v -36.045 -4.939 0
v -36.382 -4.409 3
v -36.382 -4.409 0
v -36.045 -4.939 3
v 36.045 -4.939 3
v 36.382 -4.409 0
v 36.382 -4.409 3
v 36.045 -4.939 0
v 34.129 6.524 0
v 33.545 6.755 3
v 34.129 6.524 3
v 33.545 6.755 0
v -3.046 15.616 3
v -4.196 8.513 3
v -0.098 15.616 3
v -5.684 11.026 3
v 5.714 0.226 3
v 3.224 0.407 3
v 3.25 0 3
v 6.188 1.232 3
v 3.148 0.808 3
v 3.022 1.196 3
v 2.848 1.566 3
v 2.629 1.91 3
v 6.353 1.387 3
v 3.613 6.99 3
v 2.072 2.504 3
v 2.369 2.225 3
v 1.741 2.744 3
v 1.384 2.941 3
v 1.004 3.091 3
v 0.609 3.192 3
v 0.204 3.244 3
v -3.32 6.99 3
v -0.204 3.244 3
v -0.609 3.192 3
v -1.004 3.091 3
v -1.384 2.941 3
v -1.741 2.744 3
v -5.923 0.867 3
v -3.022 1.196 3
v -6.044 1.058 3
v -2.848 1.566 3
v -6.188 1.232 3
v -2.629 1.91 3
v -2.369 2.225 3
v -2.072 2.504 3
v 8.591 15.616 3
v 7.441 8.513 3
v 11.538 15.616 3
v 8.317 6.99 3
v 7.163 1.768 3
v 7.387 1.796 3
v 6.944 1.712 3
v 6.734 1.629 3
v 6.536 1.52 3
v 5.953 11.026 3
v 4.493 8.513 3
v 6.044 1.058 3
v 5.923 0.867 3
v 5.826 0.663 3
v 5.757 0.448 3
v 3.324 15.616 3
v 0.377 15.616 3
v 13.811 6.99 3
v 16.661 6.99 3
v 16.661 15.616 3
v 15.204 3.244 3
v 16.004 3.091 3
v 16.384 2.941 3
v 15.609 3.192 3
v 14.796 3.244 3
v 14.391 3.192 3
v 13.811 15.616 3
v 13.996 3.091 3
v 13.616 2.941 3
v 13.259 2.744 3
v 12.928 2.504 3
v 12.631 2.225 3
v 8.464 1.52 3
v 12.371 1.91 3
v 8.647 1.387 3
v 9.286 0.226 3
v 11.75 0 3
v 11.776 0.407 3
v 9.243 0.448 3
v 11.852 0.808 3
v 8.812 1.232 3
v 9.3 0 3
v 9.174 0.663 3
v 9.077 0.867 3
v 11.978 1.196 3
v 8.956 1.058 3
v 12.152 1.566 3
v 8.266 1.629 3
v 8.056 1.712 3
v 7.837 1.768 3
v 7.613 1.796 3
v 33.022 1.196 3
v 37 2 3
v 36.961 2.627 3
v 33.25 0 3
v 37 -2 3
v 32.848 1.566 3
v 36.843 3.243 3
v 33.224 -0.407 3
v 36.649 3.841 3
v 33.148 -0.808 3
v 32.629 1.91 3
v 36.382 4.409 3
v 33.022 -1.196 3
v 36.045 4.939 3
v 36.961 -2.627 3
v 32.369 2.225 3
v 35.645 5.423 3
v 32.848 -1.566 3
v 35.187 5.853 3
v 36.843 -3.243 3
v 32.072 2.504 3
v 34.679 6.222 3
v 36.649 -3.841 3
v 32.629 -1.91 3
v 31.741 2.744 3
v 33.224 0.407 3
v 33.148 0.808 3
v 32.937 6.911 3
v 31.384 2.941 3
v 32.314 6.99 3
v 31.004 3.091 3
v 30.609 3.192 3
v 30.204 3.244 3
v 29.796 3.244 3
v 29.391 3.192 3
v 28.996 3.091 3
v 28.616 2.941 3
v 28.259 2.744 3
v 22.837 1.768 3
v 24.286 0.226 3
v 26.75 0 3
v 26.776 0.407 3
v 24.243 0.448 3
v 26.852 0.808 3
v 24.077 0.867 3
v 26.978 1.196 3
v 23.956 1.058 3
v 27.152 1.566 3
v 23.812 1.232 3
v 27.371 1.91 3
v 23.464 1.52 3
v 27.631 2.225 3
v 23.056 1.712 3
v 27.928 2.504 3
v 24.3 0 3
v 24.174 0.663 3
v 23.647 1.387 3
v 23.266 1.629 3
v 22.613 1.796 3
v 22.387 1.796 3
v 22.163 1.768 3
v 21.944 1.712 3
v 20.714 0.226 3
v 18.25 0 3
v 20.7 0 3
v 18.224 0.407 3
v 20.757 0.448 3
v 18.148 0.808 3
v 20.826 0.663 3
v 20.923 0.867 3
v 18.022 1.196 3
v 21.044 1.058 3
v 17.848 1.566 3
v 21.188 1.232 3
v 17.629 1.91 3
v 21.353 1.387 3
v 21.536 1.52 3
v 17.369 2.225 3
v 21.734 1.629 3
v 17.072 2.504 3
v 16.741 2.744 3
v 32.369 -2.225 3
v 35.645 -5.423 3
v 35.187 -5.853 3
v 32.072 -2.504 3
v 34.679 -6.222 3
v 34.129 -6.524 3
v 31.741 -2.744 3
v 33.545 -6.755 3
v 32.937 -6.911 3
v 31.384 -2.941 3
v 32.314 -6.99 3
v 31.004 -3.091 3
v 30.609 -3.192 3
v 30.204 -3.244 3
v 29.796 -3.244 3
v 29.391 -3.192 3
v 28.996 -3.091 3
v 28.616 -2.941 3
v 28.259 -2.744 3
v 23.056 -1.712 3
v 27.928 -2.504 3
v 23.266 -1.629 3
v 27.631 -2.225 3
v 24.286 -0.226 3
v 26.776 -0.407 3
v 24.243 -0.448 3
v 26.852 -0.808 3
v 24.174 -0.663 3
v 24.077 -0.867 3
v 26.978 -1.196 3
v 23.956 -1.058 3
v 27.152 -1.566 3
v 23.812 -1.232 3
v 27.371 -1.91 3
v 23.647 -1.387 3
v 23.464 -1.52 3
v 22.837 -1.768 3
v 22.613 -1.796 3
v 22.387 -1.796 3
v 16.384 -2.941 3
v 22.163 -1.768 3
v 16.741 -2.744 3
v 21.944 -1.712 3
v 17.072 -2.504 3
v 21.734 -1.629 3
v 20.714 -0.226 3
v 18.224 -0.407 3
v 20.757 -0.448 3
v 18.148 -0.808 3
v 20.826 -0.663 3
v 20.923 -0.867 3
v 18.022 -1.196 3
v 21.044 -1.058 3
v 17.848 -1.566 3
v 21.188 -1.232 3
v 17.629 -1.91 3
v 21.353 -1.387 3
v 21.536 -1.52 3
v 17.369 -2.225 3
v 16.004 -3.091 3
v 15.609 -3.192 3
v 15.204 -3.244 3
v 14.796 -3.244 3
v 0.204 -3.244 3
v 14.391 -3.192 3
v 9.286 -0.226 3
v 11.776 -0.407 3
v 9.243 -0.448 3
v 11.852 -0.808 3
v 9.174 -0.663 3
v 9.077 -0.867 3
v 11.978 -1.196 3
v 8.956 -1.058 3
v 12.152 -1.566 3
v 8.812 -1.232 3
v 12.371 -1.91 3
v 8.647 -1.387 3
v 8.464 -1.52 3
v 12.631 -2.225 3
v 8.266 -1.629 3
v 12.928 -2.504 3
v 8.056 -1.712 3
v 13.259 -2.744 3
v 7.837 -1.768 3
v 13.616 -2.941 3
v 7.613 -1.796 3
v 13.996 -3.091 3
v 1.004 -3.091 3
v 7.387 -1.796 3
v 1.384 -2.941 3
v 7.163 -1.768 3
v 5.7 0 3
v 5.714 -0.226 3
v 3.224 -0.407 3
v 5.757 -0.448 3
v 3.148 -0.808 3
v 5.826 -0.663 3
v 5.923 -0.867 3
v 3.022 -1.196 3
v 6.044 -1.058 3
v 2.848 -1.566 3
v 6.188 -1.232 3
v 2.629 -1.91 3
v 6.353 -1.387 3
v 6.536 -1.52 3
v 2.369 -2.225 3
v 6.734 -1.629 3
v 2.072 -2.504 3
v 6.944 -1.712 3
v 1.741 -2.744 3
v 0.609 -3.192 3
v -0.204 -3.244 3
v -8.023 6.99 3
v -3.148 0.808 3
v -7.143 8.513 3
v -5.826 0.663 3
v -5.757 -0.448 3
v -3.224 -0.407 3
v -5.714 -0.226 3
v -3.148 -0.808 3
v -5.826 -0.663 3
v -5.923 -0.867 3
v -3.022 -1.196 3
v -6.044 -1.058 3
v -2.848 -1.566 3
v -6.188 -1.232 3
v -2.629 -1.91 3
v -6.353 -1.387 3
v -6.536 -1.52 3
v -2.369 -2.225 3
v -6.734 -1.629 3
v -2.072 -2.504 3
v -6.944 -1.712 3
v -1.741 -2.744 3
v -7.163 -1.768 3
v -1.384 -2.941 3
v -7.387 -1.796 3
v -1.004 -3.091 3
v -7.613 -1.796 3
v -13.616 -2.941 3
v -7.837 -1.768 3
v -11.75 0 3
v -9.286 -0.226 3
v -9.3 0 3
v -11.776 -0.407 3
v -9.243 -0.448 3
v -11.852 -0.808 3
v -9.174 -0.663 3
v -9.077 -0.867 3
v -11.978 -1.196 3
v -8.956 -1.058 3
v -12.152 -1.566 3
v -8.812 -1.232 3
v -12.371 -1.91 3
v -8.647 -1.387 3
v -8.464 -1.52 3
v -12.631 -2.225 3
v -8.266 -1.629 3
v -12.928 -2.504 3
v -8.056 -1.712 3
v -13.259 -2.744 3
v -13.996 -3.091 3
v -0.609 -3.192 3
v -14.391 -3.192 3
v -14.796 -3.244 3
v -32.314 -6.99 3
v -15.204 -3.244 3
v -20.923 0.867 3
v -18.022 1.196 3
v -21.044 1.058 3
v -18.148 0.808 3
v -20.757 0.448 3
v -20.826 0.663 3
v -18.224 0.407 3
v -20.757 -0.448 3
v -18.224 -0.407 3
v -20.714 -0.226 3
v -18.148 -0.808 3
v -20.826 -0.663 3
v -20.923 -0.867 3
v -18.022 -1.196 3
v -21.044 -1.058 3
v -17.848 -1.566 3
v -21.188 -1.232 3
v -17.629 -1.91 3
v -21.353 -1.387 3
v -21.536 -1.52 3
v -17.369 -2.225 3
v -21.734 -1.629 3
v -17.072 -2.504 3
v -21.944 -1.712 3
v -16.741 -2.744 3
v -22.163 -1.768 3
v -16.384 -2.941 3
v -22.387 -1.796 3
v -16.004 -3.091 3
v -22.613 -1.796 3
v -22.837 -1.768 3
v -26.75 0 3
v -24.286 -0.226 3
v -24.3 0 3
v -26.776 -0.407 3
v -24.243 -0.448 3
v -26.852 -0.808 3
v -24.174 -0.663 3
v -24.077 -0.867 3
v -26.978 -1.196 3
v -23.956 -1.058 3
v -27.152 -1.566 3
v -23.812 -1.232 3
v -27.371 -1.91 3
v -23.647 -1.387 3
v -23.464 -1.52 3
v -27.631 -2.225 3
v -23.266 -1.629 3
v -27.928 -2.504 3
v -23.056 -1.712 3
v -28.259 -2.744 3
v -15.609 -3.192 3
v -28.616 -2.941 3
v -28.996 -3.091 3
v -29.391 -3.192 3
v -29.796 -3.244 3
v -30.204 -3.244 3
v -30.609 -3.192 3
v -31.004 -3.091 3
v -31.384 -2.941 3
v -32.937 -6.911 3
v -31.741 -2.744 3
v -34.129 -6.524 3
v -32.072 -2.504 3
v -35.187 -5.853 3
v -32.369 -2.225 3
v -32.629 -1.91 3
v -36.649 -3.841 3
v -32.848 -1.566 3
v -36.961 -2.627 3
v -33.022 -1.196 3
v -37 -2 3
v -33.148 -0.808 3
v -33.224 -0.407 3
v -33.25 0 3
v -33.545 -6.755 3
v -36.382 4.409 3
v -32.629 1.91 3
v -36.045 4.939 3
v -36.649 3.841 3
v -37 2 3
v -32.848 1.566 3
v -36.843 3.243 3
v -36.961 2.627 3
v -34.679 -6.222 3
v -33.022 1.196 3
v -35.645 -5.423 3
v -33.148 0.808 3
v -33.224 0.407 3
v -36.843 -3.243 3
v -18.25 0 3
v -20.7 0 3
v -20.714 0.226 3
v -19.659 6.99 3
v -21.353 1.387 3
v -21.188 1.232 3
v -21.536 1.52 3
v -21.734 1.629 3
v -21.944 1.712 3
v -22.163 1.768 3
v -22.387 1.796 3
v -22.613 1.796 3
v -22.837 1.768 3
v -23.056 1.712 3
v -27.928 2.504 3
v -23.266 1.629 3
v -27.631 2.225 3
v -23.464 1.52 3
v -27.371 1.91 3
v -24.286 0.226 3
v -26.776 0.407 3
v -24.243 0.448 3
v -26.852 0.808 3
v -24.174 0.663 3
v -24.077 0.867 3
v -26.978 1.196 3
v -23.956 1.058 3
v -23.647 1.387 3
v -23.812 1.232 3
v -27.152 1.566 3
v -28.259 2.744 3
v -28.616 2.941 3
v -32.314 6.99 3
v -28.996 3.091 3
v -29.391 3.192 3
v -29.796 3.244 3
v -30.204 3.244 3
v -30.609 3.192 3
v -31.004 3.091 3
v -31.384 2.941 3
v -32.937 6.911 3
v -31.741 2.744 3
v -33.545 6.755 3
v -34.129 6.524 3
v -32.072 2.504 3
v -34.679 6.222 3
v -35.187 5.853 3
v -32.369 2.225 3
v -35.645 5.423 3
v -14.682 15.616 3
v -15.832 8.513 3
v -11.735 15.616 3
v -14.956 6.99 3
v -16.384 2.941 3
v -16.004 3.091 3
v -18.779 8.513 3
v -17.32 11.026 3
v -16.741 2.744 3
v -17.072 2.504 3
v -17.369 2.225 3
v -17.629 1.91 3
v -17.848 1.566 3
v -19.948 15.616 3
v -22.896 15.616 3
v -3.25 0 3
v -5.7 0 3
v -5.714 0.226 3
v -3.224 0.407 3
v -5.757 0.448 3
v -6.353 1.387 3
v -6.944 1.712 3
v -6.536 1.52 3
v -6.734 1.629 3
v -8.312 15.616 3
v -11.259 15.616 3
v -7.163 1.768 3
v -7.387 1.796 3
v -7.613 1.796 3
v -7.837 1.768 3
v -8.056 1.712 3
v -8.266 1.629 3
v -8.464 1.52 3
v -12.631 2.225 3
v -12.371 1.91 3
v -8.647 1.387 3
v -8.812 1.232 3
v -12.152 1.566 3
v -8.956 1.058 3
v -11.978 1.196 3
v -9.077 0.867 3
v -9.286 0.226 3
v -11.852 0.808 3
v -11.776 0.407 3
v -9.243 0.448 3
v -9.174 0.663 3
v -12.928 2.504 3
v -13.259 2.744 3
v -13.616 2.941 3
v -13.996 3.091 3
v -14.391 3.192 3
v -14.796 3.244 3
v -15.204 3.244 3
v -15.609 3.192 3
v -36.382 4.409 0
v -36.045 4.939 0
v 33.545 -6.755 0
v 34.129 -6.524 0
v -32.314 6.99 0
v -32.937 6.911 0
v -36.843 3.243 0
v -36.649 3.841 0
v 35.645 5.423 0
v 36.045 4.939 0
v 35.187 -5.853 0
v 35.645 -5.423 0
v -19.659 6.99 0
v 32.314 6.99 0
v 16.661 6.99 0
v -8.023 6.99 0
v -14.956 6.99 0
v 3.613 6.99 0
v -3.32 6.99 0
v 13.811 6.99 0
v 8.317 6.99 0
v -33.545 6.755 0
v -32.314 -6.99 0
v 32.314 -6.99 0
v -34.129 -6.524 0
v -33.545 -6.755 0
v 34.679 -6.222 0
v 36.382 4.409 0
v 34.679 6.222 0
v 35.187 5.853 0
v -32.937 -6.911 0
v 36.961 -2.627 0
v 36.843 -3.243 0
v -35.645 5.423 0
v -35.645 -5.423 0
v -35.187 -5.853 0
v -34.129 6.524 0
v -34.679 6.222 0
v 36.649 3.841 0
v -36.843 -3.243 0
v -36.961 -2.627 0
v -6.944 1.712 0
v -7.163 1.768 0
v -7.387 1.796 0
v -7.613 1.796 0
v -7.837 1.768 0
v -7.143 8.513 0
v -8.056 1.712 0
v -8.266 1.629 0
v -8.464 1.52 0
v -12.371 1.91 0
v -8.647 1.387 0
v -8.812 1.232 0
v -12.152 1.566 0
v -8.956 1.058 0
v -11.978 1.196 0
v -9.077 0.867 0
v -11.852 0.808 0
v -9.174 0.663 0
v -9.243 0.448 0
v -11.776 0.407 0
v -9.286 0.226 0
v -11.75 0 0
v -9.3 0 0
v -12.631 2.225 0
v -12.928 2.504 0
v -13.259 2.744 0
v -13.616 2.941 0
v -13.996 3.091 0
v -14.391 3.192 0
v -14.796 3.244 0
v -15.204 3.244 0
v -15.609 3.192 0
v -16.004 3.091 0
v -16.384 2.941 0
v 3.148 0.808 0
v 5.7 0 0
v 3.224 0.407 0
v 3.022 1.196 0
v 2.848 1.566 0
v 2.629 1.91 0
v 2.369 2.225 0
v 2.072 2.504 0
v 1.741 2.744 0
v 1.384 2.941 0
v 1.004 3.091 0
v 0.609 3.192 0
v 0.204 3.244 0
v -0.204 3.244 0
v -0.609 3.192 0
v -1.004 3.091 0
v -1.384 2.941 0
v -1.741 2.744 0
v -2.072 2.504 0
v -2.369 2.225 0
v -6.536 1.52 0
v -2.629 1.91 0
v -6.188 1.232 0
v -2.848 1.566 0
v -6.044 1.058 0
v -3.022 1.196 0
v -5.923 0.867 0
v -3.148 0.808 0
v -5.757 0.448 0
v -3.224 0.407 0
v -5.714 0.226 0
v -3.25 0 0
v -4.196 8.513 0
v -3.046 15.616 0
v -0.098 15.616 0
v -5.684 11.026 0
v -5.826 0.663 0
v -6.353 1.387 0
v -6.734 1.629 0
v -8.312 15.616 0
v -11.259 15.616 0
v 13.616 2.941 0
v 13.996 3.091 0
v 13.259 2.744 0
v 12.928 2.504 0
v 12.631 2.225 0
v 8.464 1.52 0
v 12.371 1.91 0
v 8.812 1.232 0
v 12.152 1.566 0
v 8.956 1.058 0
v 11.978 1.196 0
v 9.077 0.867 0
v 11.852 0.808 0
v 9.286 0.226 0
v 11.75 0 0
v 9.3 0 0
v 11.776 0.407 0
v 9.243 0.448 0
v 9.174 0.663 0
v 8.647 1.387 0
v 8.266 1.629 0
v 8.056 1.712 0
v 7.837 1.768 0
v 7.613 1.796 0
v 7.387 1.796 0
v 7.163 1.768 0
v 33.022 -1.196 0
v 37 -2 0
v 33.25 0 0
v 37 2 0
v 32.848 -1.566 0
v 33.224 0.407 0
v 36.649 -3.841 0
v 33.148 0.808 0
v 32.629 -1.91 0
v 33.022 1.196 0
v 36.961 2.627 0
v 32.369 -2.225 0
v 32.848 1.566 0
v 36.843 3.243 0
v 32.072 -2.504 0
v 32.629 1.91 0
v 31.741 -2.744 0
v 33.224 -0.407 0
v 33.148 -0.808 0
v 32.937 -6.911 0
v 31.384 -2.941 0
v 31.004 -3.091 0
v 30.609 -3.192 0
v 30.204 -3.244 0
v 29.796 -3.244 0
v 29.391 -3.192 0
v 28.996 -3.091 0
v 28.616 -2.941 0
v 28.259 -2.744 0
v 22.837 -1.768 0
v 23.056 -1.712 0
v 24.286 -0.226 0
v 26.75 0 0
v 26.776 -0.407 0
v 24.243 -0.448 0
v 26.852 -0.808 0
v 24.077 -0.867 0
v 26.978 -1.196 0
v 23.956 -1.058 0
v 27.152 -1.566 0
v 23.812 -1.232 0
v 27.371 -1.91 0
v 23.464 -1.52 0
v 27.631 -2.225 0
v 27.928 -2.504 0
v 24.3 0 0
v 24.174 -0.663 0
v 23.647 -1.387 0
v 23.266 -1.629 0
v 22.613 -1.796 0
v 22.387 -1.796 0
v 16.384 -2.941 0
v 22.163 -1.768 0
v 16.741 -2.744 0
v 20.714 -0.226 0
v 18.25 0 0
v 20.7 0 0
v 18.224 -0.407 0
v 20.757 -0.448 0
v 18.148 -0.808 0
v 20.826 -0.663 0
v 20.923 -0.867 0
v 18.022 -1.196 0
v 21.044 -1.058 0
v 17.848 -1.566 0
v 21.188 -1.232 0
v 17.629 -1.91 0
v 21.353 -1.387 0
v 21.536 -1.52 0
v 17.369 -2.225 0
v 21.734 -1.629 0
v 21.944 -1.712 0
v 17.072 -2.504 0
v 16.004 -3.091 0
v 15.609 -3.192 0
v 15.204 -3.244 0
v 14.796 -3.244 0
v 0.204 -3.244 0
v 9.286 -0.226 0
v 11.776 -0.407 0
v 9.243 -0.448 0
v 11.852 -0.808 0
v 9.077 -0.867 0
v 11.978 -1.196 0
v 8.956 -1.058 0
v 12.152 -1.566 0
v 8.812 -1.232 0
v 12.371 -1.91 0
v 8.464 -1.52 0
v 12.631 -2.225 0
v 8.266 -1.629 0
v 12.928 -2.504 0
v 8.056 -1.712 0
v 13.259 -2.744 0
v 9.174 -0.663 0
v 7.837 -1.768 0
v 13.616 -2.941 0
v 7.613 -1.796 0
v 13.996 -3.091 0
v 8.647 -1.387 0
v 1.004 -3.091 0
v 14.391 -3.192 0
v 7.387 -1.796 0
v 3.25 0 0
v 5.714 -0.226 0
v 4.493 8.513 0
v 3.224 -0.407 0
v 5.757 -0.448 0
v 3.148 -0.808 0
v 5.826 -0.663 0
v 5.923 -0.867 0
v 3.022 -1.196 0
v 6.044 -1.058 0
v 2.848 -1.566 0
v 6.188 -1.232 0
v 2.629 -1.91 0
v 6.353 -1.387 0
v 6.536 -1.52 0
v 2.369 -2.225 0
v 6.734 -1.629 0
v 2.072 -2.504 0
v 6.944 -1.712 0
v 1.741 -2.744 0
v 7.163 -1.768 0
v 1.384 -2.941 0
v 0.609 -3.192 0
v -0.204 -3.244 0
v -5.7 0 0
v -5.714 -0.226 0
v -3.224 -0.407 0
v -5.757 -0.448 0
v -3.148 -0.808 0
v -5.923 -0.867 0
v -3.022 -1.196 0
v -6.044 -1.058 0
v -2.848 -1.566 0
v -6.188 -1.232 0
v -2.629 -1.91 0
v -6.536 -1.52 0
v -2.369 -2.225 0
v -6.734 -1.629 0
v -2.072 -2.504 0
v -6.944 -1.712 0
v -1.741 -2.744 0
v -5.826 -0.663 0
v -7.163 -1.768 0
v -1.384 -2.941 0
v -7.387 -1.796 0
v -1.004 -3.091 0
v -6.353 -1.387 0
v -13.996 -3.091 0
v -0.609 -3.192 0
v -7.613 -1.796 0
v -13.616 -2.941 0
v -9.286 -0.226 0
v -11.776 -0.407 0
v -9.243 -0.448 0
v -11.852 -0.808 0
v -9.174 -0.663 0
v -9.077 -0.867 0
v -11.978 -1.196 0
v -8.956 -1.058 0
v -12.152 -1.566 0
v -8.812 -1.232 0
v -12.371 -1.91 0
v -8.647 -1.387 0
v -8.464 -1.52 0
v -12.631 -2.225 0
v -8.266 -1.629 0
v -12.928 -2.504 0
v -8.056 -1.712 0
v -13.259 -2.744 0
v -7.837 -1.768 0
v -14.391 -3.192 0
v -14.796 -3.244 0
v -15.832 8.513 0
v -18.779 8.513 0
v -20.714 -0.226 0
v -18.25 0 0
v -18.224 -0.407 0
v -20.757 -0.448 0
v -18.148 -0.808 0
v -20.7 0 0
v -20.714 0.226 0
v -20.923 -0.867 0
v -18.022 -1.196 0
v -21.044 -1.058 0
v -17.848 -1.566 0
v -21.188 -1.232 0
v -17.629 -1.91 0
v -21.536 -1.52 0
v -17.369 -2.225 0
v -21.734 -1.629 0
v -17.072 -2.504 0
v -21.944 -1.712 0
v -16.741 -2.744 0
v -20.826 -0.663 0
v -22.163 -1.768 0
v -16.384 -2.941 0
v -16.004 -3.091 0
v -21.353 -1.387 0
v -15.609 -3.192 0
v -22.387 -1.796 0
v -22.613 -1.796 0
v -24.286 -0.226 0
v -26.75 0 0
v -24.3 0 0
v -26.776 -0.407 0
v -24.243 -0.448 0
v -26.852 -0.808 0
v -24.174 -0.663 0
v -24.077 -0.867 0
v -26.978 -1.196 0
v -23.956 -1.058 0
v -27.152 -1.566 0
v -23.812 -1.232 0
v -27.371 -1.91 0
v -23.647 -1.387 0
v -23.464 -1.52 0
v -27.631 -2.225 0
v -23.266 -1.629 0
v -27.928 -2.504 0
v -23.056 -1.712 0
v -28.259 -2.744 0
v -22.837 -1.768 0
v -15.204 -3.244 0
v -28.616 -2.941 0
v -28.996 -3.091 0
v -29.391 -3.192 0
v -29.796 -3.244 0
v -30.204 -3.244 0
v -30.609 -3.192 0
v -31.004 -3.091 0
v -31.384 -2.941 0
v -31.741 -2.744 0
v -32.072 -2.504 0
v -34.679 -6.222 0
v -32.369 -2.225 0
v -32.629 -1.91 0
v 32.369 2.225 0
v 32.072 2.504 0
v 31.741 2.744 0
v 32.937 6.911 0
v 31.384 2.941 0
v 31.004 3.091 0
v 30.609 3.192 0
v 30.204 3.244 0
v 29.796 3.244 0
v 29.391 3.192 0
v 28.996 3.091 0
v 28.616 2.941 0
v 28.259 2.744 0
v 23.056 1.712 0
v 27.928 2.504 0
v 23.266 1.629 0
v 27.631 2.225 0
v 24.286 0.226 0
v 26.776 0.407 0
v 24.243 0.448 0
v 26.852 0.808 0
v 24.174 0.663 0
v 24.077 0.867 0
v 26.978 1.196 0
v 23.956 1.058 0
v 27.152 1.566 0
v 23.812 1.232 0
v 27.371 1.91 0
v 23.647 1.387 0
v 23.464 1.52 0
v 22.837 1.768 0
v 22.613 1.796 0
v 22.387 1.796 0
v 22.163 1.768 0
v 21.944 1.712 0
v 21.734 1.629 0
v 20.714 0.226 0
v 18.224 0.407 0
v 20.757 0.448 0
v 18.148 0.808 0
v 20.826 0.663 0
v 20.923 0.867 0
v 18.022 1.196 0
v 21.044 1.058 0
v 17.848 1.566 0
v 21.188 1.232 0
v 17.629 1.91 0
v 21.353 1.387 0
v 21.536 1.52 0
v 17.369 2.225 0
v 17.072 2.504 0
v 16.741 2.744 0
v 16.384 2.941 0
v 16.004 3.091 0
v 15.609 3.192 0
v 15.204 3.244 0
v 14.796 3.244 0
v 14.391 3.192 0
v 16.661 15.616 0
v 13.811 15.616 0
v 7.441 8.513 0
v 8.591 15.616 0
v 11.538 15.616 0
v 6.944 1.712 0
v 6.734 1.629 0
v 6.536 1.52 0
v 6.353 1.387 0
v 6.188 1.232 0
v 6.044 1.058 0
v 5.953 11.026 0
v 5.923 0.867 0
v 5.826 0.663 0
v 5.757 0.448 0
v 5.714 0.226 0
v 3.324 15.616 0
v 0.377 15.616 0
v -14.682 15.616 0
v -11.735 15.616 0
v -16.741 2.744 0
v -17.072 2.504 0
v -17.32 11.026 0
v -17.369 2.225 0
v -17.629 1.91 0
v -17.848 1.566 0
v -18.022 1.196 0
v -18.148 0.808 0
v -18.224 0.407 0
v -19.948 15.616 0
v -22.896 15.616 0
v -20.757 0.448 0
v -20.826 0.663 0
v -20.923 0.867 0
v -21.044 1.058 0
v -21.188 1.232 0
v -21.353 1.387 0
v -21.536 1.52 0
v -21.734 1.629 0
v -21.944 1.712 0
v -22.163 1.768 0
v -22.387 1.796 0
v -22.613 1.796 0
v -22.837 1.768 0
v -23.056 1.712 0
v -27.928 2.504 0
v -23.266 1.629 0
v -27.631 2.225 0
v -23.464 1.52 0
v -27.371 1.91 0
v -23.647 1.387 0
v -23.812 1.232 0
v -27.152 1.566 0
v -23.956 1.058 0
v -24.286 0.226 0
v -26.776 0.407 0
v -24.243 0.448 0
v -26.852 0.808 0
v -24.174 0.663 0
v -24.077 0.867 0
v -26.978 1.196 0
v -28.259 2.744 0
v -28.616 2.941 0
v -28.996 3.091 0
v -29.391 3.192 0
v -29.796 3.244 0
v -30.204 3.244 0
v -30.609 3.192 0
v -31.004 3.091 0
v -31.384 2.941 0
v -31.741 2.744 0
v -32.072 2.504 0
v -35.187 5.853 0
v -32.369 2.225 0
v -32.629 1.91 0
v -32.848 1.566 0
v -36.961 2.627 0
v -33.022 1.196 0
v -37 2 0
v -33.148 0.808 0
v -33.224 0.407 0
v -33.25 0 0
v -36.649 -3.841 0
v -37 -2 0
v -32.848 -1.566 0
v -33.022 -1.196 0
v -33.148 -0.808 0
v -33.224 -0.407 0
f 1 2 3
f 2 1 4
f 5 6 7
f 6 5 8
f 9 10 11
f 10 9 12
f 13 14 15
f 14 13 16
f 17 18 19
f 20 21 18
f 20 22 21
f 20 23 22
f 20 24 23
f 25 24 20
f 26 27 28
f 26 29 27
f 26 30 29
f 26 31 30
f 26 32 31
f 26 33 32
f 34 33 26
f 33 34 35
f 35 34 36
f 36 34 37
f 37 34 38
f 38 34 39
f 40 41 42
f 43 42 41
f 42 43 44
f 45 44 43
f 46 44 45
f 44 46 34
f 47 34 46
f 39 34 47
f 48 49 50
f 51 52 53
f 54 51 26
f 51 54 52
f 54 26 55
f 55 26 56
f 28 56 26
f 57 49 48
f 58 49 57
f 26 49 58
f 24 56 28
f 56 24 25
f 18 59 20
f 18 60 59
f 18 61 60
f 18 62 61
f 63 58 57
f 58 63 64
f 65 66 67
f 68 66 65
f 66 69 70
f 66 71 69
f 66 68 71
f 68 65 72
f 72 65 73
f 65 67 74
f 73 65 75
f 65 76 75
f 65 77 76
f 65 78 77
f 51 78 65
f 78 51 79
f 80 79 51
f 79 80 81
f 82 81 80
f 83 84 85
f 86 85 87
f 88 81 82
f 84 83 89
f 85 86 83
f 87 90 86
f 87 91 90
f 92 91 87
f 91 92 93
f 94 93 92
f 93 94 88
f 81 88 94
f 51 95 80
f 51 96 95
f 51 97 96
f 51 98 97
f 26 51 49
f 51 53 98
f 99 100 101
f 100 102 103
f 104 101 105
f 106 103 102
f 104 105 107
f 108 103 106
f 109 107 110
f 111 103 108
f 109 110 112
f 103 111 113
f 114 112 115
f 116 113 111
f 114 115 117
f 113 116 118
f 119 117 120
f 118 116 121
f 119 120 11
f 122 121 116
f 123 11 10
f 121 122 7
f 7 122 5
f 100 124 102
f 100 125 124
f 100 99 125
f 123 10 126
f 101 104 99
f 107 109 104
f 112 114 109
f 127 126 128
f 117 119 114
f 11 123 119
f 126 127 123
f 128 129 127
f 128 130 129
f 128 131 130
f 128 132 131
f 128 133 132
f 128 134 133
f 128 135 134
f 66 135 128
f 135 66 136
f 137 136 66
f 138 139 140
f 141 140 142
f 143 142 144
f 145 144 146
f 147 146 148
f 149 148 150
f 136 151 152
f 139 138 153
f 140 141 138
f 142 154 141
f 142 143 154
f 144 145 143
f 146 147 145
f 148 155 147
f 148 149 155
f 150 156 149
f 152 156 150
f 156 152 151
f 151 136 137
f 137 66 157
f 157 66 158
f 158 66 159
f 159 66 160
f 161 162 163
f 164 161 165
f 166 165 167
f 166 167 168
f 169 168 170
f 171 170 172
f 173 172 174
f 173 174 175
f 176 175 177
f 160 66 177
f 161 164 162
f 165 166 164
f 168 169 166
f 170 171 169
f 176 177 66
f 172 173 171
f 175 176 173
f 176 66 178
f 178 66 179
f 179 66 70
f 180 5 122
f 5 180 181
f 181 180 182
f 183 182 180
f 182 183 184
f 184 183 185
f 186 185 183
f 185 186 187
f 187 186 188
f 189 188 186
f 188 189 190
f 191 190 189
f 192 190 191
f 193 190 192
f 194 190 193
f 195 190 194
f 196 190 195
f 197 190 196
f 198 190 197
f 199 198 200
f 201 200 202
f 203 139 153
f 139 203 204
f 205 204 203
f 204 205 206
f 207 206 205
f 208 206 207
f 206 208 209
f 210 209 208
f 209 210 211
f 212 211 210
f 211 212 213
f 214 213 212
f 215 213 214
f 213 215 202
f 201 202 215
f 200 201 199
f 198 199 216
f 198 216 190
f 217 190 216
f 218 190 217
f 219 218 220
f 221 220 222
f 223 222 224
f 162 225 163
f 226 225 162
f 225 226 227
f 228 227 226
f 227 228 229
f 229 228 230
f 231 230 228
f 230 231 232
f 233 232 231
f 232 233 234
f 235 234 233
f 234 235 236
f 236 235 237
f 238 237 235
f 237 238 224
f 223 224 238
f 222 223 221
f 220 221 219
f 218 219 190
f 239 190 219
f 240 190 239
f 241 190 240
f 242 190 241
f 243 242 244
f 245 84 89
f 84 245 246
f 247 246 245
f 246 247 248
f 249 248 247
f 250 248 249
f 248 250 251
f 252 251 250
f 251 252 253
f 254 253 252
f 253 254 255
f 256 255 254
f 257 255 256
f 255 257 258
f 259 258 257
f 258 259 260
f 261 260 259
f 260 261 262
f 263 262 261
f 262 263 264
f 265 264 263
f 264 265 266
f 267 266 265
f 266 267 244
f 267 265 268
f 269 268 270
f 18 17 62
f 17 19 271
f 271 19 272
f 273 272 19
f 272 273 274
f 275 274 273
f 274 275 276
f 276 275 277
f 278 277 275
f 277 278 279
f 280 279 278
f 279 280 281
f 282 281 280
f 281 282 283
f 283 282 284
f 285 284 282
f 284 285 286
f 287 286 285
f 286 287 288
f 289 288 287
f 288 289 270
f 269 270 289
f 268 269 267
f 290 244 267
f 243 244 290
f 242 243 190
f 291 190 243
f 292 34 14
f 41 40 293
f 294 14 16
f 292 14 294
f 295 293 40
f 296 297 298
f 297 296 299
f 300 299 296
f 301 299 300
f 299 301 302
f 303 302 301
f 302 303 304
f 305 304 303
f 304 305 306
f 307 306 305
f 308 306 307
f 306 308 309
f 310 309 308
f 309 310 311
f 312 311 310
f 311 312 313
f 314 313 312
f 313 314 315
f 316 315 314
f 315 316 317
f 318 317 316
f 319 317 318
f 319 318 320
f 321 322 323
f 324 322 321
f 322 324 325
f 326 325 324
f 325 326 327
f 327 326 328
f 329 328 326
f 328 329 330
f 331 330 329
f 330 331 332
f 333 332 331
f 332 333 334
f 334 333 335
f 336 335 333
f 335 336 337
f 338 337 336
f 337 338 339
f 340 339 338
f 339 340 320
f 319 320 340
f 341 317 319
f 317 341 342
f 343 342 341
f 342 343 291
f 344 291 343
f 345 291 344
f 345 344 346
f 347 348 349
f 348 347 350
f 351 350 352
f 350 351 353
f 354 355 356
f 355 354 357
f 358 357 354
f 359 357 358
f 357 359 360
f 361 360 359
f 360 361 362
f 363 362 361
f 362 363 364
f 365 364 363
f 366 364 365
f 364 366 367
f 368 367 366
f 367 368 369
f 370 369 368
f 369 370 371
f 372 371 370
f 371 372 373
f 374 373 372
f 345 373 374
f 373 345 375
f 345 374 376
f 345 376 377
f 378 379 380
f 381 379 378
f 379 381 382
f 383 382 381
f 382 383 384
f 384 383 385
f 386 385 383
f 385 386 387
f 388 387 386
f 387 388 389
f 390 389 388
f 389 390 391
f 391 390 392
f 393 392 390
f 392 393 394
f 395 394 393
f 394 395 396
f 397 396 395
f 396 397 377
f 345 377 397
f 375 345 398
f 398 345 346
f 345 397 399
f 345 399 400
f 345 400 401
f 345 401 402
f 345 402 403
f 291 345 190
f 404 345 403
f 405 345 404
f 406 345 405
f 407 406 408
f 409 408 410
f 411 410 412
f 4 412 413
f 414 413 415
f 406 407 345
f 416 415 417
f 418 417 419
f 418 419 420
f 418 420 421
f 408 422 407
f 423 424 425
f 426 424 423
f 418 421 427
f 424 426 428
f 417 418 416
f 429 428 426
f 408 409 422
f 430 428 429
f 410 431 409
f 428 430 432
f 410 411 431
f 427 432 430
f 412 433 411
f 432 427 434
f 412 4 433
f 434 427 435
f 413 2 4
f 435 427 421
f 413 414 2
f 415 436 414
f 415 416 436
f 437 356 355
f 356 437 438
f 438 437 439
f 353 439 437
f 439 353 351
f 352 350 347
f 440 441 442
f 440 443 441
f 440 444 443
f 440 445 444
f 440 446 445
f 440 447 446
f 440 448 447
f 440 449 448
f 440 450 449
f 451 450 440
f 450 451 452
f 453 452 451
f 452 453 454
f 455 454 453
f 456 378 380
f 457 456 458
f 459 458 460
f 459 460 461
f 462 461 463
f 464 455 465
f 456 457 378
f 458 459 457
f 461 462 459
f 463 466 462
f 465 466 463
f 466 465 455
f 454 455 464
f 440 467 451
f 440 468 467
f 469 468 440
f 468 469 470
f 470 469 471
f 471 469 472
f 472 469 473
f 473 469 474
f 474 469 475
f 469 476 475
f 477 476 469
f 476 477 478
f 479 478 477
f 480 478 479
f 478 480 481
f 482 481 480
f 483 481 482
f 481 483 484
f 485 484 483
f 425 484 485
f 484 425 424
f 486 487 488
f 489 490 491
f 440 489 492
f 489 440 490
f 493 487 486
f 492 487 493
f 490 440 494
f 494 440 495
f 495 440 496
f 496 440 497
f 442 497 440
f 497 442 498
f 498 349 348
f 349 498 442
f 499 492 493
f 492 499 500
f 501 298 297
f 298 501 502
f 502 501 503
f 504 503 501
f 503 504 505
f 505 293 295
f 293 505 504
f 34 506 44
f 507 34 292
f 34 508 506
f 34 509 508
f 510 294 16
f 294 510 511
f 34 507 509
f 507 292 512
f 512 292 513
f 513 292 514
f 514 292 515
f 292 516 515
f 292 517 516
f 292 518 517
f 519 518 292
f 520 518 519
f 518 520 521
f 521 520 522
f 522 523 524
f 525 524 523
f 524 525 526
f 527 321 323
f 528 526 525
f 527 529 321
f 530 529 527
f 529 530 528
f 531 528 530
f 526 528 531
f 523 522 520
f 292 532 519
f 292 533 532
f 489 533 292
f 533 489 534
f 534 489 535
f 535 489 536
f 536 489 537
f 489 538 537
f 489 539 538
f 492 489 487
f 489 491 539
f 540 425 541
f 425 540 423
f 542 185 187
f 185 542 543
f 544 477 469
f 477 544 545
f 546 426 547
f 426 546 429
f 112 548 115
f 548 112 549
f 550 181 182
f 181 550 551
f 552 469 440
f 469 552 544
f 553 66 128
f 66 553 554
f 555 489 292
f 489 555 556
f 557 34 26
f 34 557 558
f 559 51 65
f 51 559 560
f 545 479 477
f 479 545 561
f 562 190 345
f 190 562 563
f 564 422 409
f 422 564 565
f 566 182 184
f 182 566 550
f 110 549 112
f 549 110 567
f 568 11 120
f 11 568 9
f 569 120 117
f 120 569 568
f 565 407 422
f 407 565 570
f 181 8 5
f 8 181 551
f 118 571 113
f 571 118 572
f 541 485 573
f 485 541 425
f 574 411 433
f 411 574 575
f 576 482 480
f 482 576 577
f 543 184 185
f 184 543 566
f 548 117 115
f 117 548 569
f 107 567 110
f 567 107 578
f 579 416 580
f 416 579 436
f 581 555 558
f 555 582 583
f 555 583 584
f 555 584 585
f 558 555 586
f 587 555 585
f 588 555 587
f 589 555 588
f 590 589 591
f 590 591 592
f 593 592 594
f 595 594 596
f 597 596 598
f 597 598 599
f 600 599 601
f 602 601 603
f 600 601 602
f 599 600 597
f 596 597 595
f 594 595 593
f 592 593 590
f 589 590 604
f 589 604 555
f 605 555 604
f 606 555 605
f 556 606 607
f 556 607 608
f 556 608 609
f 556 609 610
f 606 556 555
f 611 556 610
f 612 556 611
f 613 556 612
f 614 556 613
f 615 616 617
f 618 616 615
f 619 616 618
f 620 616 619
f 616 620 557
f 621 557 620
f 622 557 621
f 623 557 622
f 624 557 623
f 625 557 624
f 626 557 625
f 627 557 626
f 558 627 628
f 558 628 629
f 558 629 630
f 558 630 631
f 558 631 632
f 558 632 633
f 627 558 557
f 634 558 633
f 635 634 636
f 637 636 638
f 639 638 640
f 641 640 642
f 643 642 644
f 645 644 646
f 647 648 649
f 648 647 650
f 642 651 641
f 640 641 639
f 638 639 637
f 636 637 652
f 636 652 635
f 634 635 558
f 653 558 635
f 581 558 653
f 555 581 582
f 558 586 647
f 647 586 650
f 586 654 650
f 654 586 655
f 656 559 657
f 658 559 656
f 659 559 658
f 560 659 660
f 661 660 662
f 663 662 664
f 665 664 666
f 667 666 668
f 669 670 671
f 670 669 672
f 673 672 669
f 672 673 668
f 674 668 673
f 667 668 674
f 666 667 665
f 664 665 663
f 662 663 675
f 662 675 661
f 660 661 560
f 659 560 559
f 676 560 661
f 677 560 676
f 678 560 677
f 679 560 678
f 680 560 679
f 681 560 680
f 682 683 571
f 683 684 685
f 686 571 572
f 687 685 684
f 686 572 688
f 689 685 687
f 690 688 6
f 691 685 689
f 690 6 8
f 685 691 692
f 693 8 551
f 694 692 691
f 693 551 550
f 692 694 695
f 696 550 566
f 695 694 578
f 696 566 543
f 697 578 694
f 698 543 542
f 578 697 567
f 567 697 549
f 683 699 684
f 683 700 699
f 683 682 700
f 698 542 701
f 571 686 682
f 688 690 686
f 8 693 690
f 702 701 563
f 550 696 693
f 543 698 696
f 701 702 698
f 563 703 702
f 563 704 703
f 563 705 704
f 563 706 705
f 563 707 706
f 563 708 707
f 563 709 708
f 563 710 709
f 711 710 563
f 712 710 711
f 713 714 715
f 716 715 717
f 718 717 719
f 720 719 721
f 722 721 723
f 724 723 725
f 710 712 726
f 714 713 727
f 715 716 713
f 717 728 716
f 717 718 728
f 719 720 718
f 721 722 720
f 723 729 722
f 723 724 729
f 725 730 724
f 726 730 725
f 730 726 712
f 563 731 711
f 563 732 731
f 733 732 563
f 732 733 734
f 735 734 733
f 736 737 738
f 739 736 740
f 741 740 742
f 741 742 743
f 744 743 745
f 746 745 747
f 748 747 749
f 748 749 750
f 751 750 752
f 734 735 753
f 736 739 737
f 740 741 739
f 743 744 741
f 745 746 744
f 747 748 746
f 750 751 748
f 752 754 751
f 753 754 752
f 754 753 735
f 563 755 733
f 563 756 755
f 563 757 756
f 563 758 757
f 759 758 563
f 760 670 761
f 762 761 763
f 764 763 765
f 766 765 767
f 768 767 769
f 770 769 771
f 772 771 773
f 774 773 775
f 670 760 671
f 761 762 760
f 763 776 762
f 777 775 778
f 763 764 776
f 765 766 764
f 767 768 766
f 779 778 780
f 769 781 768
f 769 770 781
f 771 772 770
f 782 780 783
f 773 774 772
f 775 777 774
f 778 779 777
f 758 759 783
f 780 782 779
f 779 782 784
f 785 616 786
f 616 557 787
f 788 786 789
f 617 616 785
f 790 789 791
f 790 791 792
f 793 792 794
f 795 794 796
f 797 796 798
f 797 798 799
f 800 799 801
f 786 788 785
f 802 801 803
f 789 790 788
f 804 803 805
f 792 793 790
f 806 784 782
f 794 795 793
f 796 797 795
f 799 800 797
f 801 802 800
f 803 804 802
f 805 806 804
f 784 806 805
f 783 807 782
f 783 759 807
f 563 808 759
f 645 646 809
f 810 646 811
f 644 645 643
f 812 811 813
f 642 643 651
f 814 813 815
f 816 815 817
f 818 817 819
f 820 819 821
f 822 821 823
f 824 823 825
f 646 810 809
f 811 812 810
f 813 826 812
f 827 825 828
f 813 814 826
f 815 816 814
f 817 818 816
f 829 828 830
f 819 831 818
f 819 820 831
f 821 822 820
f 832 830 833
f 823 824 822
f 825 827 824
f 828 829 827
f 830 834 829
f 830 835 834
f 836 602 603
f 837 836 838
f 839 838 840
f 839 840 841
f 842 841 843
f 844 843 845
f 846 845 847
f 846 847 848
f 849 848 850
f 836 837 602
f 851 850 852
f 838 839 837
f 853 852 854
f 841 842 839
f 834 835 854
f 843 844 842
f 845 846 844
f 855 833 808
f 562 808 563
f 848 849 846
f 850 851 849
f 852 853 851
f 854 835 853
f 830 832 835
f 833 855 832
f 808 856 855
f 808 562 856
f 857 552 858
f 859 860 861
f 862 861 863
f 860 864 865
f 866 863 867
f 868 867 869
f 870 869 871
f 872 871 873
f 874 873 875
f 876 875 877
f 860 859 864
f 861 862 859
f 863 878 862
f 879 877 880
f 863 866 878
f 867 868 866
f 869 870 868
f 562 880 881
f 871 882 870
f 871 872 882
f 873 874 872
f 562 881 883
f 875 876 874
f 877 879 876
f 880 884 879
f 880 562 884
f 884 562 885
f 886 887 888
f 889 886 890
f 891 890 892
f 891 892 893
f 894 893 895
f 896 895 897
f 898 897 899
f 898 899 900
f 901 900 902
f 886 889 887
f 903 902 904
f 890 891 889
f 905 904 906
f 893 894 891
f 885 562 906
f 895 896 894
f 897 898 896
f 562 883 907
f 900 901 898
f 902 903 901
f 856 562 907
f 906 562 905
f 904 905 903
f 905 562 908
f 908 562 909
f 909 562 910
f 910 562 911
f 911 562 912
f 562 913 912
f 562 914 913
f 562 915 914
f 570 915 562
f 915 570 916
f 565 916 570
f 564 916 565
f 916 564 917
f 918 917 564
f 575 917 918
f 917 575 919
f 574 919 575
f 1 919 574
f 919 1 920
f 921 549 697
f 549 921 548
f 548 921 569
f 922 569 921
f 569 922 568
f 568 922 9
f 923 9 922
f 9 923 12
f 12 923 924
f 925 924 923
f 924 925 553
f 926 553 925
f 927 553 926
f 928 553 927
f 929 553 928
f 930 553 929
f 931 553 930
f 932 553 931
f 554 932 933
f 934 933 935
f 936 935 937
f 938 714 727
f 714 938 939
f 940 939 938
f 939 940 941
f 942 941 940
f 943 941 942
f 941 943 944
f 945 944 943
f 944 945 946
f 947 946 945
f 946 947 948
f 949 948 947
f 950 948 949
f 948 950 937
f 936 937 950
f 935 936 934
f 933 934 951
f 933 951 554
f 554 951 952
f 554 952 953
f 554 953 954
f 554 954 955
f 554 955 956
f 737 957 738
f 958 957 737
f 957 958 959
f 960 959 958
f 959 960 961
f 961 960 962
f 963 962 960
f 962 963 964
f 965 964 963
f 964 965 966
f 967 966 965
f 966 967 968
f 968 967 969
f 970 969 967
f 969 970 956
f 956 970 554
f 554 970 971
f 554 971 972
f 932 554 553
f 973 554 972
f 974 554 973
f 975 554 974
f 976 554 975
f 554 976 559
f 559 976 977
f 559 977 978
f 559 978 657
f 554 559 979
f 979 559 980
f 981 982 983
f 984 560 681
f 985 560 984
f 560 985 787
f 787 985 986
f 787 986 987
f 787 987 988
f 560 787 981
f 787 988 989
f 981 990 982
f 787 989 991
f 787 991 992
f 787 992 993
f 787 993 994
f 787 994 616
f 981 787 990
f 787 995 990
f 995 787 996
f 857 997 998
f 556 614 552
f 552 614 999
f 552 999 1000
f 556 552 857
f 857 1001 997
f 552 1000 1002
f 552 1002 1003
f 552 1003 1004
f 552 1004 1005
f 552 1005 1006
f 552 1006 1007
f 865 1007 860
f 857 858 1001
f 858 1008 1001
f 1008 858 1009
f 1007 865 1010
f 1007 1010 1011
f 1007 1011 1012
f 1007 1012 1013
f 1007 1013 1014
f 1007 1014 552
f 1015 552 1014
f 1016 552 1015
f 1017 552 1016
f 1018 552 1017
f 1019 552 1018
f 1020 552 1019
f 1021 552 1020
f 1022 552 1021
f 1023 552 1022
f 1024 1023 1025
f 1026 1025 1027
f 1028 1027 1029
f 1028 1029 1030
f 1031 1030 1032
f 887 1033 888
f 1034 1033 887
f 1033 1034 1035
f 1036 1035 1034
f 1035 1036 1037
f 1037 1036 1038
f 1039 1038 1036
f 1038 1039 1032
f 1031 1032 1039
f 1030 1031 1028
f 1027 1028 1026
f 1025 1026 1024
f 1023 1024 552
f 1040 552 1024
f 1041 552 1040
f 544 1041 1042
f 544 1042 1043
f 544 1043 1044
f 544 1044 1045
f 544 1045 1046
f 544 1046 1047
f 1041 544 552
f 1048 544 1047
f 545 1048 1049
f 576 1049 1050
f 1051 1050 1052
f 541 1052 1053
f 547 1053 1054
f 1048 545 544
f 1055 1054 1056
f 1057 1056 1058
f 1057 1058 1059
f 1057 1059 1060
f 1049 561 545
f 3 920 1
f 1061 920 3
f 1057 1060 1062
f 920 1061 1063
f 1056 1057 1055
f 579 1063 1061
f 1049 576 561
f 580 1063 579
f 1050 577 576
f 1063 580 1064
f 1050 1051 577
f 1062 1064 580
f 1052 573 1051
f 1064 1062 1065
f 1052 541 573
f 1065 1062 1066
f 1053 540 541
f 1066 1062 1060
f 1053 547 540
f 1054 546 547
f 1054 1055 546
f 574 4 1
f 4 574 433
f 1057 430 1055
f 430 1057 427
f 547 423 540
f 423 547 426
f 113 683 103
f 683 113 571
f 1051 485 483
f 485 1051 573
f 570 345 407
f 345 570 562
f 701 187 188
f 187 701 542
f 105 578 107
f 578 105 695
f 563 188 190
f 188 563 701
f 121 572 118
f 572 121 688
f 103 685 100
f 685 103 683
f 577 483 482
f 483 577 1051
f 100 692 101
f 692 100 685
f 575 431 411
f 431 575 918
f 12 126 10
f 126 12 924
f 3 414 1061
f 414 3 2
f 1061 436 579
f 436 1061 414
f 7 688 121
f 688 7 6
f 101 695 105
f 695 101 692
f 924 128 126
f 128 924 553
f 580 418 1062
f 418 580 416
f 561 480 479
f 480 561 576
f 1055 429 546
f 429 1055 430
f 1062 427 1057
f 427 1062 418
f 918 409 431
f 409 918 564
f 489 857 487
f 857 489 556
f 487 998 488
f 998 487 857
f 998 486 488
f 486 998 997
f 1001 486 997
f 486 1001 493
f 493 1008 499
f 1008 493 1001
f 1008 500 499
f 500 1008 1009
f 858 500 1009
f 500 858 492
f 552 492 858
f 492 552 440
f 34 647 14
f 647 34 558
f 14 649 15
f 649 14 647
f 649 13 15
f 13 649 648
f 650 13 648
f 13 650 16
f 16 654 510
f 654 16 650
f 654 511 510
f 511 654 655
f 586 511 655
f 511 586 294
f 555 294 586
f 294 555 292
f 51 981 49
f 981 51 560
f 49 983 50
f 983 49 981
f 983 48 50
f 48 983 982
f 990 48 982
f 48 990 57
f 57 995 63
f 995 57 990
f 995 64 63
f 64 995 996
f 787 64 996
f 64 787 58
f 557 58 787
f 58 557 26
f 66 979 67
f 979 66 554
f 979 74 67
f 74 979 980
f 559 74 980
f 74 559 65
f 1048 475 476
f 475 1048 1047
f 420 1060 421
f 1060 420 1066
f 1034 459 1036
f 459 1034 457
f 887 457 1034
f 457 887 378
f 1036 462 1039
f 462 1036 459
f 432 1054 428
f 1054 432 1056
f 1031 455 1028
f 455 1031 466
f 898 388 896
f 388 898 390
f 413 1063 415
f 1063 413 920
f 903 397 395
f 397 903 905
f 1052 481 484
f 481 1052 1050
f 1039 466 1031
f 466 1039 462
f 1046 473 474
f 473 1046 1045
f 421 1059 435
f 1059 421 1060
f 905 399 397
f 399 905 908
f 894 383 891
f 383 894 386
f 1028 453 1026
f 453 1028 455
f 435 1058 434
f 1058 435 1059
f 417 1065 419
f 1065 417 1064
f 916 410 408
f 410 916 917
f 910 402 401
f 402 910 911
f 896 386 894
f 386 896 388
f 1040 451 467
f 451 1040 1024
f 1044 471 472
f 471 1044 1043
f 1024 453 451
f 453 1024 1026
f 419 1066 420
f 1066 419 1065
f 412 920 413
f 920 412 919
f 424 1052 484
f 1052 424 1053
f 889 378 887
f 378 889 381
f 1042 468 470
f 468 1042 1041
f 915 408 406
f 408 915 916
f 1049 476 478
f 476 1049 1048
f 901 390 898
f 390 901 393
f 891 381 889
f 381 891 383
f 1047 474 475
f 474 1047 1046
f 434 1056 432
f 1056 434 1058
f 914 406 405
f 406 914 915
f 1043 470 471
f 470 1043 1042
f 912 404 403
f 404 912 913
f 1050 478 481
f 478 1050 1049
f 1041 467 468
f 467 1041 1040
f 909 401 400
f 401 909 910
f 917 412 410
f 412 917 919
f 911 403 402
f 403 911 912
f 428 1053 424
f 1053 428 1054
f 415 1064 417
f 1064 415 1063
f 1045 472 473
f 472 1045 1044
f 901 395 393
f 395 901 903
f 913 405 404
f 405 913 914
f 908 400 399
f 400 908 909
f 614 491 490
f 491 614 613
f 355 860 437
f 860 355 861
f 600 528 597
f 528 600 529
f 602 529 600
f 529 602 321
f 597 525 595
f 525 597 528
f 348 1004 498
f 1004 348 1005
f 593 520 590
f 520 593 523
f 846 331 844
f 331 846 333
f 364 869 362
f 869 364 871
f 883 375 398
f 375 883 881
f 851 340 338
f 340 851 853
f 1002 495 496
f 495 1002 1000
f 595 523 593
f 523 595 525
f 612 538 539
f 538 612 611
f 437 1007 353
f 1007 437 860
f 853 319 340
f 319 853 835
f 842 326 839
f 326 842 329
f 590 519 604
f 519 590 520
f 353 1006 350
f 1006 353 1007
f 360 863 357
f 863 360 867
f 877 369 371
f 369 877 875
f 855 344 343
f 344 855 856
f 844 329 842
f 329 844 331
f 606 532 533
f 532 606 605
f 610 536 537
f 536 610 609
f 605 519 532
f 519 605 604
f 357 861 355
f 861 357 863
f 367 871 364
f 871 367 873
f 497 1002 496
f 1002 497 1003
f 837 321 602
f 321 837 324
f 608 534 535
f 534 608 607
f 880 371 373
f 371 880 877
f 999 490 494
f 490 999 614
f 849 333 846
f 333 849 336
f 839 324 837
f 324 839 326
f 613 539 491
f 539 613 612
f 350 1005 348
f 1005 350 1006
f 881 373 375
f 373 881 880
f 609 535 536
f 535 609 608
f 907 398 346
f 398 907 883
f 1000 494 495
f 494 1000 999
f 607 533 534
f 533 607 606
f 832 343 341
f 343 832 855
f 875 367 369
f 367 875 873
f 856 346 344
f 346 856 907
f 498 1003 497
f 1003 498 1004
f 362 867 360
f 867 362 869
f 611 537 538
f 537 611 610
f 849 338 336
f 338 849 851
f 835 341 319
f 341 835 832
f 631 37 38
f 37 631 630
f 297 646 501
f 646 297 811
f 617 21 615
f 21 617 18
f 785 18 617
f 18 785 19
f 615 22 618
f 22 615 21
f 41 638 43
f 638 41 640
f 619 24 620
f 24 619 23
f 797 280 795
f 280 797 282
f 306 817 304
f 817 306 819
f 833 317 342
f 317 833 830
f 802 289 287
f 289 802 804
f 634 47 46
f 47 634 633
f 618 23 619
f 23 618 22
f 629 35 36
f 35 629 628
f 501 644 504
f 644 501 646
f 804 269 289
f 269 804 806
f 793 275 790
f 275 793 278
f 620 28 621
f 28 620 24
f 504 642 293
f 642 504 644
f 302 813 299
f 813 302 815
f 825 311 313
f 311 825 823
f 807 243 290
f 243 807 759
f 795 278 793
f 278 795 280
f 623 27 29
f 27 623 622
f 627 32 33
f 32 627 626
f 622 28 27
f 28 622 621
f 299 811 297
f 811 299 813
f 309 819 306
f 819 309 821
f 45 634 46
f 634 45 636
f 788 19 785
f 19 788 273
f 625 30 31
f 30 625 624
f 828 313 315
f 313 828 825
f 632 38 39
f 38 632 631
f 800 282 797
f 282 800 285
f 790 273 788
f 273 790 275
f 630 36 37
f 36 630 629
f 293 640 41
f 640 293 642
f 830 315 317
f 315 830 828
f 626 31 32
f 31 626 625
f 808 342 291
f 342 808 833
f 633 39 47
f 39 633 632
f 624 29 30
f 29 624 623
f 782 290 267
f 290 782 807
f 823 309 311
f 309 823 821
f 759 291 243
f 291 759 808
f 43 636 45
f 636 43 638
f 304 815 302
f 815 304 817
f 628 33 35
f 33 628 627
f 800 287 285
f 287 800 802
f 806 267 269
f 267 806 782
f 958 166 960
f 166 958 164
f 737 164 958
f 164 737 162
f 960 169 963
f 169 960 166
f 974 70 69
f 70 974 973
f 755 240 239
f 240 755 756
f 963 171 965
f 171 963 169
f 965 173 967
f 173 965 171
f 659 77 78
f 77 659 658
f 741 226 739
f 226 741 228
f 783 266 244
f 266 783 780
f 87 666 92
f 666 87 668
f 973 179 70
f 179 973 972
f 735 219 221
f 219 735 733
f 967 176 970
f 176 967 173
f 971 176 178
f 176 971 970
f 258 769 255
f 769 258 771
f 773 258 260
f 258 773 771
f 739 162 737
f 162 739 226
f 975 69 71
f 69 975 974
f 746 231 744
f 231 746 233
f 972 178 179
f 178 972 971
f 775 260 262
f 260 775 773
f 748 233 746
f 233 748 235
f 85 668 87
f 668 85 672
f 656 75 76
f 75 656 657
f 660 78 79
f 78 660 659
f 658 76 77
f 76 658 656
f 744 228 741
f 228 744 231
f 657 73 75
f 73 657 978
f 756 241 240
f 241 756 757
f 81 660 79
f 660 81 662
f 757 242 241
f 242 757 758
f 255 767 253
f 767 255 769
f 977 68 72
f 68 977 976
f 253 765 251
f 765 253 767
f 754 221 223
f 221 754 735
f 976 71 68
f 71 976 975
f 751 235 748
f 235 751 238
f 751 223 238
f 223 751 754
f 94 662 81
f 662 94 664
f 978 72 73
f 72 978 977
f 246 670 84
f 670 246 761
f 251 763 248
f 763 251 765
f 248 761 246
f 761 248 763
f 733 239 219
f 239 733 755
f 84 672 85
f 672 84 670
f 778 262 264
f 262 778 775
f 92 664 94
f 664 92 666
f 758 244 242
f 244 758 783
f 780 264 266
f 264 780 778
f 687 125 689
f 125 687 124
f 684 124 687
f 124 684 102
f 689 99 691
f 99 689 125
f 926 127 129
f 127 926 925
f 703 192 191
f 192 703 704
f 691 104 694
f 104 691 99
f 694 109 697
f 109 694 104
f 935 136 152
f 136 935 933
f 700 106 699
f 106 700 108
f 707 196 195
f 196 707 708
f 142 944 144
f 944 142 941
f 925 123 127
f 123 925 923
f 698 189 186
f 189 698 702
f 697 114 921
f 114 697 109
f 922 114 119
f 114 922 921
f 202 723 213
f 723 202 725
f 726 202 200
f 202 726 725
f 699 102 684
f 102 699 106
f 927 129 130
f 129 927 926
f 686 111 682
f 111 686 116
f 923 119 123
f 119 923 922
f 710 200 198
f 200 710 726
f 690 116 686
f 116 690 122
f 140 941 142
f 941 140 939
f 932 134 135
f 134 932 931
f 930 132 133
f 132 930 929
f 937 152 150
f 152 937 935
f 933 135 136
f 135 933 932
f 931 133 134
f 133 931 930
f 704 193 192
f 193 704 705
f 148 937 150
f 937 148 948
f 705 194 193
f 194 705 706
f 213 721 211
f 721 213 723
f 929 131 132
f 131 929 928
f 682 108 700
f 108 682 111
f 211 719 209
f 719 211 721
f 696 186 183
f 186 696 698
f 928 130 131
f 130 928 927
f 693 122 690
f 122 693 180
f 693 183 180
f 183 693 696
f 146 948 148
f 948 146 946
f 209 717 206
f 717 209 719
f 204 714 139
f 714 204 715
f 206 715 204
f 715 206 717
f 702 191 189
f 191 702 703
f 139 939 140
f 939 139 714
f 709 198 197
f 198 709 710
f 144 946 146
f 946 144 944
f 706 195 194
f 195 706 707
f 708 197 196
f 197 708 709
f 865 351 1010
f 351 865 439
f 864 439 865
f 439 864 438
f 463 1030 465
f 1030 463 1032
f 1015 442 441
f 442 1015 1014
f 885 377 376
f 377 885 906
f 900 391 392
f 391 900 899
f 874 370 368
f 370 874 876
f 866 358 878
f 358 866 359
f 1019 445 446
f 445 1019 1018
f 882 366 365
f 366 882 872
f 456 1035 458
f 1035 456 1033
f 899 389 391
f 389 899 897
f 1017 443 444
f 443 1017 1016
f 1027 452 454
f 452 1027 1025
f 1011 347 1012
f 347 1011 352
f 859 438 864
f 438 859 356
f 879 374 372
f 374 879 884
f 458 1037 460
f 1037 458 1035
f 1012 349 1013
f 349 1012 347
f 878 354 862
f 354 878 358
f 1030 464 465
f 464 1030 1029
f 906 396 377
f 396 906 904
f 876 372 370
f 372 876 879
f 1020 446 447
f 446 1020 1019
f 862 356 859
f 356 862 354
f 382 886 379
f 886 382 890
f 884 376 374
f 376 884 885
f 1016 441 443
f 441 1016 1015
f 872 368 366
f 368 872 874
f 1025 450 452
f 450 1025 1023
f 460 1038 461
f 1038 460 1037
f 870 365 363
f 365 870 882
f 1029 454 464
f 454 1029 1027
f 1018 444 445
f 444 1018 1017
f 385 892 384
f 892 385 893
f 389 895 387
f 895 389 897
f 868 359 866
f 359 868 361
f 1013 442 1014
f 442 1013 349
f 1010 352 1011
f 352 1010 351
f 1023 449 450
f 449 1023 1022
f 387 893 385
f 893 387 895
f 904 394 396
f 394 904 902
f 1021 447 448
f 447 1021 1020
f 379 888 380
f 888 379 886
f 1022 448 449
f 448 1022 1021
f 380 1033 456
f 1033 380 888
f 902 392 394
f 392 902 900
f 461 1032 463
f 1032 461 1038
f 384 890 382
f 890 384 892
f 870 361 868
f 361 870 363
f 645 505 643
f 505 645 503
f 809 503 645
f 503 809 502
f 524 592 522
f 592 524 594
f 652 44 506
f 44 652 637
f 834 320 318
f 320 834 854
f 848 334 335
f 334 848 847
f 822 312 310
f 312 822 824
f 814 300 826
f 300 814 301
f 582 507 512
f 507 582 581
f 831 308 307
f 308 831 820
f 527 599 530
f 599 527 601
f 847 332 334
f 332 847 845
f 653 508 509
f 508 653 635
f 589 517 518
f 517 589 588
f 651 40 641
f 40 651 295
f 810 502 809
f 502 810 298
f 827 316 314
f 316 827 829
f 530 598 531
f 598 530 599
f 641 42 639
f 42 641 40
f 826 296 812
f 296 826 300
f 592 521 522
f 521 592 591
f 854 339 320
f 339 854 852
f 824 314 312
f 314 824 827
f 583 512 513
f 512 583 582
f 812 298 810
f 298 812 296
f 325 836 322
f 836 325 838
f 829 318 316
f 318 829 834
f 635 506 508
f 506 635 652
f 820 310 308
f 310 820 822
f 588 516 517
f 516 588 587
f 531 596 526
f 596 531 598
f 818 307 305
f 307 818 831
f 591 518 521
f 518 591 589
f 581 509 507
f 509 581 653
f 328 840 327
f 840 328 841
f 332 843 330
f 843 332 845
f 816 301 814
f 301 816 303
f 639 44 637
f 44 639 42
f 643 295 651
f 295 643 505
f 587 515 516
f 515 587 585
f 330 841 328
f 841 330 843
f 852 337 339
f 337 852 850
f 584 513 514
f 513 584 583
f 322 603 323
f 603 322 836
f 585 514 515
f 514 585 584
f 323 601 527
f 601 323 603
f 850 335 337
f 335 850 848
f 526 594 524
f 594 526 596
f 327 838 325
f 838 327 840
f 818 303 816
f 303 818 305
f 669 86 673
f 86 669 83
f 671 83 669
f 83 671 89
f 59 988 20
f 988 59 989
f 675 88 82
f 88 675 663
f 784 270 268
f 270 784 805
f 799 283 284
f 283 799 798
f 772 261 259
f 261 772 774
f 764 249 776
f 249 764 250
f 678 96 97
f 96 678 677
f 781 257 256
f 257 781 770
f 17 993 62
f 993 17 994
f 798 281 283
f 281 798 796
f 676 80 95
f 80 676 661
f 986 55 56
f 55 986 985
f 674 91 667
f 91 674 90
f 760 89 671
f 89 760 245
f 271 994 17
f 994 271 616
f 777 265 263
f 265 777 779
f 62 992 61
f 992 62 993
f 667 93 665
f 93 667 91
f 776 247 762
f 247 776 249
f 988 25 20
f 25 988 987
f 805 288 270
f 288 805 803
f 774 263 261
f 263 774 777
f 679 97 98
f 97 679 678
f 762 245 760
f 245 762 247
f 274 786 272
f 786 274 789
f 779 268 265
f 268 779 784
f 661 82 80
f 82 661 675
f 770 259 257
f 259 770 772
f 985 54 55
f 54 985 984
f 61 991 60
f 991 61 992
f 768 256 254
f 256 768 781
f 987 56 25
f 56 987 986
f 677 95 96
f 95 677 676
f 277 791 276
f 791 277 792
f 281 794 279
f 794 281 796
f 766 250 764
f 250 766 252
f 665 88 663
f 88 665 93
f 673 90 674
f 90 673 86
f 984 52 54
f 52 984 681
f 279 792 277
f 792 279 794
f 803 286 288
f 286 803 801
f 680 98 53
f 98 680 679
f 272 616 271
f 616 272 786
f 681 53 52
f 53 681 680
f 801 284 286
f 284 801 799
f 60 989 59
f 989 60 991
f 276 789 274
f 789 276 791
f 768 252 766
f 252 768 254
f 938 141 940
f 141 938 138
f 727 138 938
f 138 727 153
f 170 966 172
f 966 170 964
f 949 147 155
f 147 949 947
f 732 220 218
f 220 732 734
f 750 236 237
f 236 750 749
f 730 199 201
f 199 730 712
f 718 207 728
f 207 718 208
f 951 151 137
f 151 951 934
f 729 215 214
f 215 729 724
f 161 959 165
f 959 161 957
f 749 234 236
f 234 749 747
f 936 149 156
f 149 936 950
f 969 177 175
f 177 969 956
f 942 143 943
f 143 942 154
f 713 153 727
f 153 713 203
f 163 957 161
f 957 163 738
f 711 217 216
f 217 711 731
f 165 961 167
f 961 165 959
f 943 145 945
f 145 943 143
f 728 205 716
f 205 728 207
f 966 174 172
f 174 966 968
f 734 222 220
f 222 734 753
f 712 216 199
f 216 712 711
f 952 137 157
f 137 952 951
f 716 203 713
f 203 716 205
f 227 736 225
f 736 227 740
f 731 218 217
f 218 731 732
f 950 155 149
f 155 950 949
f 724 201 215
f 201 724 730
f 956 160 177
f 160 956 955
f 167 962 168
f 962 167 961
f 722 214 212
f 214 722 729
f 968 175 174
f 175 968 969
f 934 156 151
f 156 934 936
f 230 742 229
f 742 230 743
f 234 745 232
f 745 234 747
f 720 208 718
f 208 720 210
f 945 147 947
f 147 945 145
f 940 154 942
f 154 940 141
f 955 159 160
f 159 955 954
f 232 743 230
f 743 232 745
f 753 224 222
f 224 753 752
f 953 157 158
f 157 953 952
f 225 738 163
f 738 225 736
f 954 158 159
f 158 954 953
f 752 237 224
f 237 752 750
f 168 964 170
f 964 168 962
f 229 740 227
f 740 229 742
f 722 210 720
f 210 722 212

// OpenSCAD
$fn = 50;


difference() {
	union() {
		hull() {
			translate(v = [-32.0000000000, 2.0000000000, 0]) {
				cylinder(h = 3, r = 5);
			}
			translate(v = [32.0000000000, 2.0000000000, 0]) {
				cylinder(h = 3, r = 5);
			}
			translate(v = [-32.0000000000, -2.0000000000, 0]) {
				cylinder(h = 3, r = 5);
			}
			translate(v = [32.0000000000, -2.0000000000, 0]) {
				cylinder(h = 3, r = 5);
			}
		}
		translate(v = [0, 15.2777777778, 0]) {
			linear_extrude(height = 3) {
				text(font = "DejaVu Sans Mono:style=Bold", halign = "center", size = 14.2500000000, text = "XXXL", valign = "top");
			}
		}
	}
	union() {
		translate(v = [-30.0000000000, 0.0000000000, 0]) {
			translate(v = [0, 0, -100]) {
				cylinder(h = 200, r = 3.2500000000);
			}
		}
		translate(v = [-15.0000000000, 0.0000000000, 0]) {
			translate(v = [0, 0, -100]) {
				cylinder(h = 200, r = 3.2500000000);
			}
		}
		translate(v = [0, 0, -100]) {
			cylinder(h = 200, r = 3.2500000000);
		}
		translate(v = [15.0000000000, 0.0000000000, 0]) {
			translate(v = [0, 0, -100]) {
				cylinder(h = 200, r = 3.2500000000);
			}
		}
		translate(v = [30.0000000000, 0.0000000000, 0]) {
			translate(v = [0, 0, -100]) {
				cylinder(h = 200, r = 3.2500000000);
			}
		}
		translate(v = [-30.0000000000, 0.0000000000, 0]) {
			translate(v = [0, 0, -100]) {
				cylinder(h = 200, r = 1.8000000000);
			}
		}
		translate(v = [-22.5000000000, 0.0000000000, 0]) {
			translate(v = [0, 0, -100]) {
				cylinder(h = 200, r = 1.8000000000);
			}
		}
		translate(v = [-15.0000000000, 0.0000000000, 0]) {
			translate(v = [0, 0, -100]) {
				cylinder(h = 200, r = 1.8000000000);
			}
		}
		translate(v = [-7.5000000000, 0.0000000000, 0]) {
			translate(v = [0, 0, -100]) {
				cylinder(h = 200, r = 1.8000000000);
			}
		}
		translate(v = [0, 0, -100]) {
			cylinder(h = 200, r = 1.8000000000);
		}
		translate(v = [7.5000000000, 0.0000000000, 0]) {
			translate(v = [0, 0, -100]) {
				cylinder(h = 200, r = 1.8000000000);
			}
		}
		translate(v = [15.0000000000, 0.0000000000, 0]) {
			translate(v = [0, 0, -100]) {
				cylinder(h = 200, r = 1.8000000000);
			}
		}
		translate(v = [22.5000000000, 0.0000000000, 0]) {
			translate(v = [0, 0, -100]) {
				cylinder(h = 200, r = 1.8000000000);
			}
		}
		translate(v = [30.0000000000, 0.0000000000, 0]) {
			translate(v = [0, 0, -100]) {
				cylinder(h = 200, r = 1.8000000000);
			}
		}
	}
}
